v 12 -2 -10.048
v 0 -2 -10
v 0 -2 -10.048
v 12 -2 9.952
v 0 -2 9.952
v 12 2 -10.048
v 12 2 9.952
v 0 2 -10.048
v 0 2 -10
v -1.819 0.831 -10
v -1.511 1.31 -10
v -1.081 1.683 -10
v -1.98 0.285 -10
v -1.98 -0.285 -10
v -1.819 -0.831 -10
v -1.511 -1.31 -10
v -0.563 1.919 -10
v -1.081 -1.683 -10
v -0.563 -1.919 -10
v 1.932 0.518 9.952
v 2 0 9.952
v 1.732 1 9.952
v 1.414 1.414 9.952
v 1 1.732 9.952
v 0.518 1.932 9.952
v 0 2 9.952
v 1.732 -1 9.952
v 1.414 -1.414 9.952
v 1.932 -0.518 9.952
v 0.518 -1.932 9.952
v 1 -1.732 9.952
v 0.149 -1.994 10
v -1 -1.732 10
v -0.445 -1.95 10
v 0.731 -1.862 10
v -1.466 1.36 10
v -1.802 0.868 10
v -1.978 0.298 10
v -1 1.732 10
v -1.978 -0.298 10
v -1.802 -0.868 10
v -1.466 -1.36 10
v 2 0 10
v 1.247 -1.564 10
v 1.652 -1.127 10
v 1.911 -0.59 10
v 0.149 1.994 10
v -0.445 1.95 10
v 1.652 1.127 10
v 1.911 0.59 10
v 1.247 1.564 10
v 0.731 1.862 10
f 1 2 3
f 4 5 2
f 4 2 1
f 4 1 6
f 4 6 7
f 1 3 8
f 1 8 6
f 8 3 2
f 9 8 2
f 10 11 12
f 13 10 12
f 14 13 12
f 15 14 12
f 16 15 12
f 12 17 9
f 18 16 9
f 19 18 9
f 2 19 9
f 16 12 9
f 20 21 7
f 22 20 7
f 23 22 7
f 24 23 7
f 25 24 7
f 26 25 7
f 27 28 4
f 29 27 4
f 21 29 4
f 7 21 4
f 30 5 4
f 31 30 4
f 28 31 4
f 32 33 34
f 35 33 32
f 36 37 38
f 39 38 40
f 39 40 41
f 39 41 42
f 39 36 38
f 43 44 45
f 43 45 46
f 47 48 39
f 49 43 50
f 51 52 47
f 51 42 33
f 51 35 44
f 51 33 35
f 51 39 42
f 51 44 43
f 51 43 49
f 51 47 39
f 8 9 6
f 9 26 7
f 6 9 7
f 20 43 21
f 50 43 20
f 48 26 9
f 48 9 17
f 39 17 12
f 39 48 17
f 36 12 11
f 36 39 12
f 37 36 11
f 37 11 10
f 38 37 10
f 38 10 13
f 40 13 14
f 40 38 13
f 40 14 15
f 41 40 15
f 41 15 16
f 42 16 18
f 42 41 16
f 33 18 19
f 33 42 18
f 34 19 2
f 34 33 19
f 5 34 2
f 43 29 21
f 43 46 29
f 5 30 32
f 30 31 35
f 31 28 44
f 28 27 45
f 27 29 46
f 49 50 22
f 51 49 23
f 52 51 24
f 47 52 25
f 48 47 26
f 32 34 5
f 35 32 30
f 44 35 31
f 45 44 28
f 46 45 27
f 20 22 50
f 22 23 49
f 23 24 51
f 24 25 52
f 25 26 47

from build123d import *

# Parameters (mm, degrees)
F0_R     = 2
F1_DEPTH = 10
F2_W     = 12
F2_H     = 20
F3_DEPTH = 2


with BuildPart() as f1:
    # F0 (on Top) → F1 (new body, symmetric)
    with BuildSketch(Plane.XY):
        Circle(F0_R)
    extrude(amount=F1_DEPTH, both=True)

    # F2 (on Front) → F3 (join, symmetric)
    with BuildSketch(Plane.XZ):
        with Locations((6, -0.047689)):
            Rectangle(F2_W, F2_H)
    extrude(amount=F3_DEPTH, both=True)


solid = f1.part
